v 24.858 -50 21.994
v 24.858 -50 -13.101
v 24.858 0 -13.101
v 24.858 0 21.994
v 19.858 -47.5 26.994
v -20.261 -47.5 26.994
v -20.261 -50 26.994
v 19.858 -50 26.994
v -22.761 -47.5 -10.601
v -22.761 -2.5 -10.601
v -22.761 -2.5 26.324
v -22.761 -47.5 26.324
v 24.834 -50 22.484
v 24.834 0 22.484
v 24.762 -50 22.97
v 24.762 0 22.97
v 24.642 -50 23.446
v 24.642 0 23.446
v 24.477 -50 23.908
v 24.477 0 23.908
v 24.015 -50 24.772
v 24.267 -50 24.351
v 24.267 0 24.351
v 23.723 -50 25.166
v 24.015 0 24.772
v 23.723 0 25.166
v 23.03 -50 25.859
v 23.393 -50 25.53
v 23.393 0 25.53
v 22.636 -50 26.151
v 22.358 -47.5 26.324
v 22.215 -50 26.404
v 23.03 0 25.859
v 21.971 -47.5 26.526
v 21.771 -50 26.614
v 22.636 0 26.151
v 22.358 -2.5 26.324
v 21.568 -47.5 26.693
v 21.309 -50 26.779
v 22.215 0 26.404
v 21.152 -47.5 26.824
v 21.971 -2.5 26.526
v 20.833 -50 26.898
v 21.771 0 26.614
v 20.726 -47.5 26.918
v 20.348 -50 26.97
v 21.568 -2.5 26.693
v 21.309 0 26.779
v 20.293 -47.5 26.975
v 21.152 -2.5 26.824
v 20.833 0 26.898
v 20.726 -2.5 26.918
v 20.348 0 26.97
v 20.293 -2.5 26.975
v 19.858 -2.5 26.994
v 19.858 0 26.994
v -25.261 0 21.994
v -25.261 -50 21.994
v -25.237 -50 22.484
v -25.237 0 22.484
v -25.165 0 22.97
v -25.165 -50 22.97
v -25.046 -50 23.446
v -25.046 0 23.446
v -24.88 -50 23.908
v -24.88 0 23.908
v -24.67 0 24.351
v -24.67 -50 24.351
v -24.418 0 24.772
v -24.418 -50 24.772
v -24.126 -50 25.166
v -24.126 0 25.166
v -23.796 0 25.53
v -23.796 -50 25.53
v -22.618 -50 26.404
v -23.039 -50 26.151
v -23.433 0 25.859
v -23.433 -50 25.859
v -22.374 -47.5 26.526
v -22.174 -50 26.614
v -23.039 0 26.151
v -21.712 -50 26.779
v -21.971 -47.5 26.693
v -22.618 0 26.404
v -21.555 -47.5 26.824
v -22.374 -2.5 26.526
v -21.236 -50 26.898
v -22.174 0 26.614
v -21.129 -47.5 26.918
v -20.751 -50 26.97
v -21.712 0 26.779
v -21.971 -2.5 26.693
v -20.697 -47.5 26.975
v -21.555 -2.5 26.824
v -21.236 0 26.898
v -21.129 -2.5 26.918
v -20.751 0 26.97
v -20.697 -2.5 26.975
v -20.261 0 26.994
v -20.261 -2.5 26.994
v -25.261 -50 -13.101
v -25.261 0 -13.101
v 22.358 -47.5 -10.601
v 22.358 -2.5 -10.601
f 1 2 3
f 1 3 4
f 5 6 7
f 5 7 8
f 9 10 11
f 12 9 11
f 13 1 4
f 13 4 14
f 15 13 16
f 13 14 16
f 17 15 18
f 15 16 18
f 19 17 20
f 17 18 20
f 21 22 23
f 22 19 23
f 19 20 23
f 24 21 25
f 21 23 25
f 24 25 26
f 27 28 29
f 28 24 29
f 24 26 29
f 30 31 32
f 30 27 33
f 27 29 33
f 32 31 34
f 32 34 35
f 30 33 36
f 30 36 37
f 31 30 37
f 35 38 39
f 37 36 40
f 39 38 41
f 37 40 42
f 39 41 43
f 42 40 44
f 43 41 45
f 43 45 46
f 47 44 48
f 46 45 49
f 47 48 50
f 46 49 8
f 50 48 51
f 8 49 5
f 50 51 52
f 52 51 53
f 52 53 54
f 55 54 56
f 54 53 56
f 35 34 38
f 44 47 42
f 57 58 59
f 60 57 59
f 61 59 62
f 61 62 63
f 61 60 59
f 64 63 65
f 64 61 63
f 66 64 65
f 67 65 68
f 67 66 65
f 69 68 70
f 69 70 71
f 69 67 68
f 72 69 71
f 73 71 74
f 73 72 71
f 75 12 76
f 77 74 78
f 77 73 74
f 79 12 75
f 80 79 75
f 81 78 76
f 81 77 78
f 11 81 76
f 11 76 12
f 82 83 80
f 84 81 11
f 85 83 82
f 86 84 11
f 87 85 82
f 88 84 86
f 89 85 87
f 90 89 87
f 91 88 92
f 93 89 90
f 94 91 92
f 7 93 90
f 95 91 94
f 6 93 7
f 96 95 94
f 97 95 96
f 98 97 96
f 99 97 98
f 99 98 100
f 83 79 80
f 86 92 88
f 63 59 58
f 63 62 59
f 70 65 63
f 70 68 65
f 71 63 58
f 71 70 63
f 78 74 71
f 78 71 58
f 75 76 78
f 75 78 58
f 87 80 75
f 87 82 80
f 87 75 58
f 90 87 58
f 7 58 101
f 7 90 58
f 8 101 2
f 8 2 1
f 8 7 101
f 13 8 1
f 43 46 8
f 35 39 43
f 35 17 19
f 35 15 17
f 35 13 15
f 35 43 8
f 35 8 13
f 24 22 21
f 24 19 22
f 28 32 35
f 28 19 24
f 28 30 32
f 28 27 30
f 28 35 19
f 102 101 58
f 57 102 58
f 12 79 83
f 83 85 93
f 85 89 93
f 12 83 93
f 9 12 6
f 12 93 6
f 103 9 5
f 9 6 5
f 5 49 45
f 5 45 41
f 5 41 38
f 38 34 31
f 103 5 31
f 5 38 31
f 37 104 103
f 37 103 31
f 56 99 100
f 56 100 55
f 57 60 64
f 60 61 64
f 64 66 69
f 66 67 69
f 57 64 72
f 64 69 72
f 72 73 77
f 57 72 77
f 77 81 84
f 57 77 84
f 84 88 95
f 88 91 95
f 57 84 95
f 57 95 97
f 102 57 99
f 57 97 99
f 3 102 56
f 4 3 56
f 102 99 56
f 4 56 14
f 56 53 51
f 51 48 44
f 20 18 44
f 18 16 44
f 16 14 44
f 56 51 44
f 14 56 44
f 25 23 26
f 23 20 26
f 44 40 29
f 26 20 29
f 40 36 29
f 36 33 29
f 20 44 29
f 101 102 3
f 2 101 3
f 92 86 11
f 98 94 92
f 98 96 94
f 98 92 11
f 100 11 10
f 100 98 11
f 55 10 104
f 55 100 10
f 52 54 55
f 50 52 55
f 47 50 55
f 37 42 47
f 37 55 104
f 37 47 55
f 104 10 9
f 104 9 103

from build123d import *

# Parameters (mm, degrees)
F0_W        = 50.1185376197
F0_H        = 40.0948291644
F1_DEPTH    = 50
F2_T        = -2.5
F3_T1_DEPTH = 75
F4_T1_DEPTH = 75


# Not quite as in the source:
# - a fillet or chamfer that OpenCascade refuses, or shapes differently, is made with other operations: its cross-section is extruded or revolved along the edge and cut away or added


with BuildPart() as f1:
    # F0 (on Front) → F1 (new body)
    with BuildSketch(Plane.XZ):
        with Locations((-0.201604329, 6.9467336871)):
            Rectangle(F0_W, F0_H)
    extrude(amount=F1_DEPTH)

    # F2
    f2_openings = [f1.faces().sort_by_distance(p)[0] for p in [
        (-0.201604, -25, 26.994148),
    ]]
    offset(amount=F2_T, openings=f2_openings)

    # F3: fillet of radius 5 on 1 edges, made by hand

    # F3_s2 → F3_t1 (cut)
    with BuildSketch(Plane.XZ.offset(-12.5)):
        with BuildLine():
            ThreePointArc((24.8576644808, 21.9941482693), (23.3931983867, 25.5296821752), (19.8576644808, 26.9941482693))
            Line((19.8576644808, 26.9941482693), (24.8576644808, 26.9941482693))
            Line((24.8576644808, 26.9941482693), (24.8576644808, 21.9941482693))
        make_face()
    extrude(amount=F3_T1_DEPTH, mode=Mode.SUBTRACT)

    # F4: fillet of radius 5 on 1 edges, made by hand

    # F4_s2 → F4_t1 (cut)
    with BuildSketch(Plane.XZ.offset(-12.5)):
        with BuildLine():
            ThreePointArc((-25.2608731389, 21.9941482693), (-23.7964070448, 25.5296821752), (-20.2608731389, 26.9941482693))
            Line((-20.2608731389, 26.9941482693), (-25.2608731389, 26.9941482693))
            Line((-25.2608731389, 26.9941482693), (-25.2608731389, 21.9941482693))
        make_face()
    extrude(amount=F4_T1_DEPTH, mode=Mode.SUBTRACT)


solid = f1.part
